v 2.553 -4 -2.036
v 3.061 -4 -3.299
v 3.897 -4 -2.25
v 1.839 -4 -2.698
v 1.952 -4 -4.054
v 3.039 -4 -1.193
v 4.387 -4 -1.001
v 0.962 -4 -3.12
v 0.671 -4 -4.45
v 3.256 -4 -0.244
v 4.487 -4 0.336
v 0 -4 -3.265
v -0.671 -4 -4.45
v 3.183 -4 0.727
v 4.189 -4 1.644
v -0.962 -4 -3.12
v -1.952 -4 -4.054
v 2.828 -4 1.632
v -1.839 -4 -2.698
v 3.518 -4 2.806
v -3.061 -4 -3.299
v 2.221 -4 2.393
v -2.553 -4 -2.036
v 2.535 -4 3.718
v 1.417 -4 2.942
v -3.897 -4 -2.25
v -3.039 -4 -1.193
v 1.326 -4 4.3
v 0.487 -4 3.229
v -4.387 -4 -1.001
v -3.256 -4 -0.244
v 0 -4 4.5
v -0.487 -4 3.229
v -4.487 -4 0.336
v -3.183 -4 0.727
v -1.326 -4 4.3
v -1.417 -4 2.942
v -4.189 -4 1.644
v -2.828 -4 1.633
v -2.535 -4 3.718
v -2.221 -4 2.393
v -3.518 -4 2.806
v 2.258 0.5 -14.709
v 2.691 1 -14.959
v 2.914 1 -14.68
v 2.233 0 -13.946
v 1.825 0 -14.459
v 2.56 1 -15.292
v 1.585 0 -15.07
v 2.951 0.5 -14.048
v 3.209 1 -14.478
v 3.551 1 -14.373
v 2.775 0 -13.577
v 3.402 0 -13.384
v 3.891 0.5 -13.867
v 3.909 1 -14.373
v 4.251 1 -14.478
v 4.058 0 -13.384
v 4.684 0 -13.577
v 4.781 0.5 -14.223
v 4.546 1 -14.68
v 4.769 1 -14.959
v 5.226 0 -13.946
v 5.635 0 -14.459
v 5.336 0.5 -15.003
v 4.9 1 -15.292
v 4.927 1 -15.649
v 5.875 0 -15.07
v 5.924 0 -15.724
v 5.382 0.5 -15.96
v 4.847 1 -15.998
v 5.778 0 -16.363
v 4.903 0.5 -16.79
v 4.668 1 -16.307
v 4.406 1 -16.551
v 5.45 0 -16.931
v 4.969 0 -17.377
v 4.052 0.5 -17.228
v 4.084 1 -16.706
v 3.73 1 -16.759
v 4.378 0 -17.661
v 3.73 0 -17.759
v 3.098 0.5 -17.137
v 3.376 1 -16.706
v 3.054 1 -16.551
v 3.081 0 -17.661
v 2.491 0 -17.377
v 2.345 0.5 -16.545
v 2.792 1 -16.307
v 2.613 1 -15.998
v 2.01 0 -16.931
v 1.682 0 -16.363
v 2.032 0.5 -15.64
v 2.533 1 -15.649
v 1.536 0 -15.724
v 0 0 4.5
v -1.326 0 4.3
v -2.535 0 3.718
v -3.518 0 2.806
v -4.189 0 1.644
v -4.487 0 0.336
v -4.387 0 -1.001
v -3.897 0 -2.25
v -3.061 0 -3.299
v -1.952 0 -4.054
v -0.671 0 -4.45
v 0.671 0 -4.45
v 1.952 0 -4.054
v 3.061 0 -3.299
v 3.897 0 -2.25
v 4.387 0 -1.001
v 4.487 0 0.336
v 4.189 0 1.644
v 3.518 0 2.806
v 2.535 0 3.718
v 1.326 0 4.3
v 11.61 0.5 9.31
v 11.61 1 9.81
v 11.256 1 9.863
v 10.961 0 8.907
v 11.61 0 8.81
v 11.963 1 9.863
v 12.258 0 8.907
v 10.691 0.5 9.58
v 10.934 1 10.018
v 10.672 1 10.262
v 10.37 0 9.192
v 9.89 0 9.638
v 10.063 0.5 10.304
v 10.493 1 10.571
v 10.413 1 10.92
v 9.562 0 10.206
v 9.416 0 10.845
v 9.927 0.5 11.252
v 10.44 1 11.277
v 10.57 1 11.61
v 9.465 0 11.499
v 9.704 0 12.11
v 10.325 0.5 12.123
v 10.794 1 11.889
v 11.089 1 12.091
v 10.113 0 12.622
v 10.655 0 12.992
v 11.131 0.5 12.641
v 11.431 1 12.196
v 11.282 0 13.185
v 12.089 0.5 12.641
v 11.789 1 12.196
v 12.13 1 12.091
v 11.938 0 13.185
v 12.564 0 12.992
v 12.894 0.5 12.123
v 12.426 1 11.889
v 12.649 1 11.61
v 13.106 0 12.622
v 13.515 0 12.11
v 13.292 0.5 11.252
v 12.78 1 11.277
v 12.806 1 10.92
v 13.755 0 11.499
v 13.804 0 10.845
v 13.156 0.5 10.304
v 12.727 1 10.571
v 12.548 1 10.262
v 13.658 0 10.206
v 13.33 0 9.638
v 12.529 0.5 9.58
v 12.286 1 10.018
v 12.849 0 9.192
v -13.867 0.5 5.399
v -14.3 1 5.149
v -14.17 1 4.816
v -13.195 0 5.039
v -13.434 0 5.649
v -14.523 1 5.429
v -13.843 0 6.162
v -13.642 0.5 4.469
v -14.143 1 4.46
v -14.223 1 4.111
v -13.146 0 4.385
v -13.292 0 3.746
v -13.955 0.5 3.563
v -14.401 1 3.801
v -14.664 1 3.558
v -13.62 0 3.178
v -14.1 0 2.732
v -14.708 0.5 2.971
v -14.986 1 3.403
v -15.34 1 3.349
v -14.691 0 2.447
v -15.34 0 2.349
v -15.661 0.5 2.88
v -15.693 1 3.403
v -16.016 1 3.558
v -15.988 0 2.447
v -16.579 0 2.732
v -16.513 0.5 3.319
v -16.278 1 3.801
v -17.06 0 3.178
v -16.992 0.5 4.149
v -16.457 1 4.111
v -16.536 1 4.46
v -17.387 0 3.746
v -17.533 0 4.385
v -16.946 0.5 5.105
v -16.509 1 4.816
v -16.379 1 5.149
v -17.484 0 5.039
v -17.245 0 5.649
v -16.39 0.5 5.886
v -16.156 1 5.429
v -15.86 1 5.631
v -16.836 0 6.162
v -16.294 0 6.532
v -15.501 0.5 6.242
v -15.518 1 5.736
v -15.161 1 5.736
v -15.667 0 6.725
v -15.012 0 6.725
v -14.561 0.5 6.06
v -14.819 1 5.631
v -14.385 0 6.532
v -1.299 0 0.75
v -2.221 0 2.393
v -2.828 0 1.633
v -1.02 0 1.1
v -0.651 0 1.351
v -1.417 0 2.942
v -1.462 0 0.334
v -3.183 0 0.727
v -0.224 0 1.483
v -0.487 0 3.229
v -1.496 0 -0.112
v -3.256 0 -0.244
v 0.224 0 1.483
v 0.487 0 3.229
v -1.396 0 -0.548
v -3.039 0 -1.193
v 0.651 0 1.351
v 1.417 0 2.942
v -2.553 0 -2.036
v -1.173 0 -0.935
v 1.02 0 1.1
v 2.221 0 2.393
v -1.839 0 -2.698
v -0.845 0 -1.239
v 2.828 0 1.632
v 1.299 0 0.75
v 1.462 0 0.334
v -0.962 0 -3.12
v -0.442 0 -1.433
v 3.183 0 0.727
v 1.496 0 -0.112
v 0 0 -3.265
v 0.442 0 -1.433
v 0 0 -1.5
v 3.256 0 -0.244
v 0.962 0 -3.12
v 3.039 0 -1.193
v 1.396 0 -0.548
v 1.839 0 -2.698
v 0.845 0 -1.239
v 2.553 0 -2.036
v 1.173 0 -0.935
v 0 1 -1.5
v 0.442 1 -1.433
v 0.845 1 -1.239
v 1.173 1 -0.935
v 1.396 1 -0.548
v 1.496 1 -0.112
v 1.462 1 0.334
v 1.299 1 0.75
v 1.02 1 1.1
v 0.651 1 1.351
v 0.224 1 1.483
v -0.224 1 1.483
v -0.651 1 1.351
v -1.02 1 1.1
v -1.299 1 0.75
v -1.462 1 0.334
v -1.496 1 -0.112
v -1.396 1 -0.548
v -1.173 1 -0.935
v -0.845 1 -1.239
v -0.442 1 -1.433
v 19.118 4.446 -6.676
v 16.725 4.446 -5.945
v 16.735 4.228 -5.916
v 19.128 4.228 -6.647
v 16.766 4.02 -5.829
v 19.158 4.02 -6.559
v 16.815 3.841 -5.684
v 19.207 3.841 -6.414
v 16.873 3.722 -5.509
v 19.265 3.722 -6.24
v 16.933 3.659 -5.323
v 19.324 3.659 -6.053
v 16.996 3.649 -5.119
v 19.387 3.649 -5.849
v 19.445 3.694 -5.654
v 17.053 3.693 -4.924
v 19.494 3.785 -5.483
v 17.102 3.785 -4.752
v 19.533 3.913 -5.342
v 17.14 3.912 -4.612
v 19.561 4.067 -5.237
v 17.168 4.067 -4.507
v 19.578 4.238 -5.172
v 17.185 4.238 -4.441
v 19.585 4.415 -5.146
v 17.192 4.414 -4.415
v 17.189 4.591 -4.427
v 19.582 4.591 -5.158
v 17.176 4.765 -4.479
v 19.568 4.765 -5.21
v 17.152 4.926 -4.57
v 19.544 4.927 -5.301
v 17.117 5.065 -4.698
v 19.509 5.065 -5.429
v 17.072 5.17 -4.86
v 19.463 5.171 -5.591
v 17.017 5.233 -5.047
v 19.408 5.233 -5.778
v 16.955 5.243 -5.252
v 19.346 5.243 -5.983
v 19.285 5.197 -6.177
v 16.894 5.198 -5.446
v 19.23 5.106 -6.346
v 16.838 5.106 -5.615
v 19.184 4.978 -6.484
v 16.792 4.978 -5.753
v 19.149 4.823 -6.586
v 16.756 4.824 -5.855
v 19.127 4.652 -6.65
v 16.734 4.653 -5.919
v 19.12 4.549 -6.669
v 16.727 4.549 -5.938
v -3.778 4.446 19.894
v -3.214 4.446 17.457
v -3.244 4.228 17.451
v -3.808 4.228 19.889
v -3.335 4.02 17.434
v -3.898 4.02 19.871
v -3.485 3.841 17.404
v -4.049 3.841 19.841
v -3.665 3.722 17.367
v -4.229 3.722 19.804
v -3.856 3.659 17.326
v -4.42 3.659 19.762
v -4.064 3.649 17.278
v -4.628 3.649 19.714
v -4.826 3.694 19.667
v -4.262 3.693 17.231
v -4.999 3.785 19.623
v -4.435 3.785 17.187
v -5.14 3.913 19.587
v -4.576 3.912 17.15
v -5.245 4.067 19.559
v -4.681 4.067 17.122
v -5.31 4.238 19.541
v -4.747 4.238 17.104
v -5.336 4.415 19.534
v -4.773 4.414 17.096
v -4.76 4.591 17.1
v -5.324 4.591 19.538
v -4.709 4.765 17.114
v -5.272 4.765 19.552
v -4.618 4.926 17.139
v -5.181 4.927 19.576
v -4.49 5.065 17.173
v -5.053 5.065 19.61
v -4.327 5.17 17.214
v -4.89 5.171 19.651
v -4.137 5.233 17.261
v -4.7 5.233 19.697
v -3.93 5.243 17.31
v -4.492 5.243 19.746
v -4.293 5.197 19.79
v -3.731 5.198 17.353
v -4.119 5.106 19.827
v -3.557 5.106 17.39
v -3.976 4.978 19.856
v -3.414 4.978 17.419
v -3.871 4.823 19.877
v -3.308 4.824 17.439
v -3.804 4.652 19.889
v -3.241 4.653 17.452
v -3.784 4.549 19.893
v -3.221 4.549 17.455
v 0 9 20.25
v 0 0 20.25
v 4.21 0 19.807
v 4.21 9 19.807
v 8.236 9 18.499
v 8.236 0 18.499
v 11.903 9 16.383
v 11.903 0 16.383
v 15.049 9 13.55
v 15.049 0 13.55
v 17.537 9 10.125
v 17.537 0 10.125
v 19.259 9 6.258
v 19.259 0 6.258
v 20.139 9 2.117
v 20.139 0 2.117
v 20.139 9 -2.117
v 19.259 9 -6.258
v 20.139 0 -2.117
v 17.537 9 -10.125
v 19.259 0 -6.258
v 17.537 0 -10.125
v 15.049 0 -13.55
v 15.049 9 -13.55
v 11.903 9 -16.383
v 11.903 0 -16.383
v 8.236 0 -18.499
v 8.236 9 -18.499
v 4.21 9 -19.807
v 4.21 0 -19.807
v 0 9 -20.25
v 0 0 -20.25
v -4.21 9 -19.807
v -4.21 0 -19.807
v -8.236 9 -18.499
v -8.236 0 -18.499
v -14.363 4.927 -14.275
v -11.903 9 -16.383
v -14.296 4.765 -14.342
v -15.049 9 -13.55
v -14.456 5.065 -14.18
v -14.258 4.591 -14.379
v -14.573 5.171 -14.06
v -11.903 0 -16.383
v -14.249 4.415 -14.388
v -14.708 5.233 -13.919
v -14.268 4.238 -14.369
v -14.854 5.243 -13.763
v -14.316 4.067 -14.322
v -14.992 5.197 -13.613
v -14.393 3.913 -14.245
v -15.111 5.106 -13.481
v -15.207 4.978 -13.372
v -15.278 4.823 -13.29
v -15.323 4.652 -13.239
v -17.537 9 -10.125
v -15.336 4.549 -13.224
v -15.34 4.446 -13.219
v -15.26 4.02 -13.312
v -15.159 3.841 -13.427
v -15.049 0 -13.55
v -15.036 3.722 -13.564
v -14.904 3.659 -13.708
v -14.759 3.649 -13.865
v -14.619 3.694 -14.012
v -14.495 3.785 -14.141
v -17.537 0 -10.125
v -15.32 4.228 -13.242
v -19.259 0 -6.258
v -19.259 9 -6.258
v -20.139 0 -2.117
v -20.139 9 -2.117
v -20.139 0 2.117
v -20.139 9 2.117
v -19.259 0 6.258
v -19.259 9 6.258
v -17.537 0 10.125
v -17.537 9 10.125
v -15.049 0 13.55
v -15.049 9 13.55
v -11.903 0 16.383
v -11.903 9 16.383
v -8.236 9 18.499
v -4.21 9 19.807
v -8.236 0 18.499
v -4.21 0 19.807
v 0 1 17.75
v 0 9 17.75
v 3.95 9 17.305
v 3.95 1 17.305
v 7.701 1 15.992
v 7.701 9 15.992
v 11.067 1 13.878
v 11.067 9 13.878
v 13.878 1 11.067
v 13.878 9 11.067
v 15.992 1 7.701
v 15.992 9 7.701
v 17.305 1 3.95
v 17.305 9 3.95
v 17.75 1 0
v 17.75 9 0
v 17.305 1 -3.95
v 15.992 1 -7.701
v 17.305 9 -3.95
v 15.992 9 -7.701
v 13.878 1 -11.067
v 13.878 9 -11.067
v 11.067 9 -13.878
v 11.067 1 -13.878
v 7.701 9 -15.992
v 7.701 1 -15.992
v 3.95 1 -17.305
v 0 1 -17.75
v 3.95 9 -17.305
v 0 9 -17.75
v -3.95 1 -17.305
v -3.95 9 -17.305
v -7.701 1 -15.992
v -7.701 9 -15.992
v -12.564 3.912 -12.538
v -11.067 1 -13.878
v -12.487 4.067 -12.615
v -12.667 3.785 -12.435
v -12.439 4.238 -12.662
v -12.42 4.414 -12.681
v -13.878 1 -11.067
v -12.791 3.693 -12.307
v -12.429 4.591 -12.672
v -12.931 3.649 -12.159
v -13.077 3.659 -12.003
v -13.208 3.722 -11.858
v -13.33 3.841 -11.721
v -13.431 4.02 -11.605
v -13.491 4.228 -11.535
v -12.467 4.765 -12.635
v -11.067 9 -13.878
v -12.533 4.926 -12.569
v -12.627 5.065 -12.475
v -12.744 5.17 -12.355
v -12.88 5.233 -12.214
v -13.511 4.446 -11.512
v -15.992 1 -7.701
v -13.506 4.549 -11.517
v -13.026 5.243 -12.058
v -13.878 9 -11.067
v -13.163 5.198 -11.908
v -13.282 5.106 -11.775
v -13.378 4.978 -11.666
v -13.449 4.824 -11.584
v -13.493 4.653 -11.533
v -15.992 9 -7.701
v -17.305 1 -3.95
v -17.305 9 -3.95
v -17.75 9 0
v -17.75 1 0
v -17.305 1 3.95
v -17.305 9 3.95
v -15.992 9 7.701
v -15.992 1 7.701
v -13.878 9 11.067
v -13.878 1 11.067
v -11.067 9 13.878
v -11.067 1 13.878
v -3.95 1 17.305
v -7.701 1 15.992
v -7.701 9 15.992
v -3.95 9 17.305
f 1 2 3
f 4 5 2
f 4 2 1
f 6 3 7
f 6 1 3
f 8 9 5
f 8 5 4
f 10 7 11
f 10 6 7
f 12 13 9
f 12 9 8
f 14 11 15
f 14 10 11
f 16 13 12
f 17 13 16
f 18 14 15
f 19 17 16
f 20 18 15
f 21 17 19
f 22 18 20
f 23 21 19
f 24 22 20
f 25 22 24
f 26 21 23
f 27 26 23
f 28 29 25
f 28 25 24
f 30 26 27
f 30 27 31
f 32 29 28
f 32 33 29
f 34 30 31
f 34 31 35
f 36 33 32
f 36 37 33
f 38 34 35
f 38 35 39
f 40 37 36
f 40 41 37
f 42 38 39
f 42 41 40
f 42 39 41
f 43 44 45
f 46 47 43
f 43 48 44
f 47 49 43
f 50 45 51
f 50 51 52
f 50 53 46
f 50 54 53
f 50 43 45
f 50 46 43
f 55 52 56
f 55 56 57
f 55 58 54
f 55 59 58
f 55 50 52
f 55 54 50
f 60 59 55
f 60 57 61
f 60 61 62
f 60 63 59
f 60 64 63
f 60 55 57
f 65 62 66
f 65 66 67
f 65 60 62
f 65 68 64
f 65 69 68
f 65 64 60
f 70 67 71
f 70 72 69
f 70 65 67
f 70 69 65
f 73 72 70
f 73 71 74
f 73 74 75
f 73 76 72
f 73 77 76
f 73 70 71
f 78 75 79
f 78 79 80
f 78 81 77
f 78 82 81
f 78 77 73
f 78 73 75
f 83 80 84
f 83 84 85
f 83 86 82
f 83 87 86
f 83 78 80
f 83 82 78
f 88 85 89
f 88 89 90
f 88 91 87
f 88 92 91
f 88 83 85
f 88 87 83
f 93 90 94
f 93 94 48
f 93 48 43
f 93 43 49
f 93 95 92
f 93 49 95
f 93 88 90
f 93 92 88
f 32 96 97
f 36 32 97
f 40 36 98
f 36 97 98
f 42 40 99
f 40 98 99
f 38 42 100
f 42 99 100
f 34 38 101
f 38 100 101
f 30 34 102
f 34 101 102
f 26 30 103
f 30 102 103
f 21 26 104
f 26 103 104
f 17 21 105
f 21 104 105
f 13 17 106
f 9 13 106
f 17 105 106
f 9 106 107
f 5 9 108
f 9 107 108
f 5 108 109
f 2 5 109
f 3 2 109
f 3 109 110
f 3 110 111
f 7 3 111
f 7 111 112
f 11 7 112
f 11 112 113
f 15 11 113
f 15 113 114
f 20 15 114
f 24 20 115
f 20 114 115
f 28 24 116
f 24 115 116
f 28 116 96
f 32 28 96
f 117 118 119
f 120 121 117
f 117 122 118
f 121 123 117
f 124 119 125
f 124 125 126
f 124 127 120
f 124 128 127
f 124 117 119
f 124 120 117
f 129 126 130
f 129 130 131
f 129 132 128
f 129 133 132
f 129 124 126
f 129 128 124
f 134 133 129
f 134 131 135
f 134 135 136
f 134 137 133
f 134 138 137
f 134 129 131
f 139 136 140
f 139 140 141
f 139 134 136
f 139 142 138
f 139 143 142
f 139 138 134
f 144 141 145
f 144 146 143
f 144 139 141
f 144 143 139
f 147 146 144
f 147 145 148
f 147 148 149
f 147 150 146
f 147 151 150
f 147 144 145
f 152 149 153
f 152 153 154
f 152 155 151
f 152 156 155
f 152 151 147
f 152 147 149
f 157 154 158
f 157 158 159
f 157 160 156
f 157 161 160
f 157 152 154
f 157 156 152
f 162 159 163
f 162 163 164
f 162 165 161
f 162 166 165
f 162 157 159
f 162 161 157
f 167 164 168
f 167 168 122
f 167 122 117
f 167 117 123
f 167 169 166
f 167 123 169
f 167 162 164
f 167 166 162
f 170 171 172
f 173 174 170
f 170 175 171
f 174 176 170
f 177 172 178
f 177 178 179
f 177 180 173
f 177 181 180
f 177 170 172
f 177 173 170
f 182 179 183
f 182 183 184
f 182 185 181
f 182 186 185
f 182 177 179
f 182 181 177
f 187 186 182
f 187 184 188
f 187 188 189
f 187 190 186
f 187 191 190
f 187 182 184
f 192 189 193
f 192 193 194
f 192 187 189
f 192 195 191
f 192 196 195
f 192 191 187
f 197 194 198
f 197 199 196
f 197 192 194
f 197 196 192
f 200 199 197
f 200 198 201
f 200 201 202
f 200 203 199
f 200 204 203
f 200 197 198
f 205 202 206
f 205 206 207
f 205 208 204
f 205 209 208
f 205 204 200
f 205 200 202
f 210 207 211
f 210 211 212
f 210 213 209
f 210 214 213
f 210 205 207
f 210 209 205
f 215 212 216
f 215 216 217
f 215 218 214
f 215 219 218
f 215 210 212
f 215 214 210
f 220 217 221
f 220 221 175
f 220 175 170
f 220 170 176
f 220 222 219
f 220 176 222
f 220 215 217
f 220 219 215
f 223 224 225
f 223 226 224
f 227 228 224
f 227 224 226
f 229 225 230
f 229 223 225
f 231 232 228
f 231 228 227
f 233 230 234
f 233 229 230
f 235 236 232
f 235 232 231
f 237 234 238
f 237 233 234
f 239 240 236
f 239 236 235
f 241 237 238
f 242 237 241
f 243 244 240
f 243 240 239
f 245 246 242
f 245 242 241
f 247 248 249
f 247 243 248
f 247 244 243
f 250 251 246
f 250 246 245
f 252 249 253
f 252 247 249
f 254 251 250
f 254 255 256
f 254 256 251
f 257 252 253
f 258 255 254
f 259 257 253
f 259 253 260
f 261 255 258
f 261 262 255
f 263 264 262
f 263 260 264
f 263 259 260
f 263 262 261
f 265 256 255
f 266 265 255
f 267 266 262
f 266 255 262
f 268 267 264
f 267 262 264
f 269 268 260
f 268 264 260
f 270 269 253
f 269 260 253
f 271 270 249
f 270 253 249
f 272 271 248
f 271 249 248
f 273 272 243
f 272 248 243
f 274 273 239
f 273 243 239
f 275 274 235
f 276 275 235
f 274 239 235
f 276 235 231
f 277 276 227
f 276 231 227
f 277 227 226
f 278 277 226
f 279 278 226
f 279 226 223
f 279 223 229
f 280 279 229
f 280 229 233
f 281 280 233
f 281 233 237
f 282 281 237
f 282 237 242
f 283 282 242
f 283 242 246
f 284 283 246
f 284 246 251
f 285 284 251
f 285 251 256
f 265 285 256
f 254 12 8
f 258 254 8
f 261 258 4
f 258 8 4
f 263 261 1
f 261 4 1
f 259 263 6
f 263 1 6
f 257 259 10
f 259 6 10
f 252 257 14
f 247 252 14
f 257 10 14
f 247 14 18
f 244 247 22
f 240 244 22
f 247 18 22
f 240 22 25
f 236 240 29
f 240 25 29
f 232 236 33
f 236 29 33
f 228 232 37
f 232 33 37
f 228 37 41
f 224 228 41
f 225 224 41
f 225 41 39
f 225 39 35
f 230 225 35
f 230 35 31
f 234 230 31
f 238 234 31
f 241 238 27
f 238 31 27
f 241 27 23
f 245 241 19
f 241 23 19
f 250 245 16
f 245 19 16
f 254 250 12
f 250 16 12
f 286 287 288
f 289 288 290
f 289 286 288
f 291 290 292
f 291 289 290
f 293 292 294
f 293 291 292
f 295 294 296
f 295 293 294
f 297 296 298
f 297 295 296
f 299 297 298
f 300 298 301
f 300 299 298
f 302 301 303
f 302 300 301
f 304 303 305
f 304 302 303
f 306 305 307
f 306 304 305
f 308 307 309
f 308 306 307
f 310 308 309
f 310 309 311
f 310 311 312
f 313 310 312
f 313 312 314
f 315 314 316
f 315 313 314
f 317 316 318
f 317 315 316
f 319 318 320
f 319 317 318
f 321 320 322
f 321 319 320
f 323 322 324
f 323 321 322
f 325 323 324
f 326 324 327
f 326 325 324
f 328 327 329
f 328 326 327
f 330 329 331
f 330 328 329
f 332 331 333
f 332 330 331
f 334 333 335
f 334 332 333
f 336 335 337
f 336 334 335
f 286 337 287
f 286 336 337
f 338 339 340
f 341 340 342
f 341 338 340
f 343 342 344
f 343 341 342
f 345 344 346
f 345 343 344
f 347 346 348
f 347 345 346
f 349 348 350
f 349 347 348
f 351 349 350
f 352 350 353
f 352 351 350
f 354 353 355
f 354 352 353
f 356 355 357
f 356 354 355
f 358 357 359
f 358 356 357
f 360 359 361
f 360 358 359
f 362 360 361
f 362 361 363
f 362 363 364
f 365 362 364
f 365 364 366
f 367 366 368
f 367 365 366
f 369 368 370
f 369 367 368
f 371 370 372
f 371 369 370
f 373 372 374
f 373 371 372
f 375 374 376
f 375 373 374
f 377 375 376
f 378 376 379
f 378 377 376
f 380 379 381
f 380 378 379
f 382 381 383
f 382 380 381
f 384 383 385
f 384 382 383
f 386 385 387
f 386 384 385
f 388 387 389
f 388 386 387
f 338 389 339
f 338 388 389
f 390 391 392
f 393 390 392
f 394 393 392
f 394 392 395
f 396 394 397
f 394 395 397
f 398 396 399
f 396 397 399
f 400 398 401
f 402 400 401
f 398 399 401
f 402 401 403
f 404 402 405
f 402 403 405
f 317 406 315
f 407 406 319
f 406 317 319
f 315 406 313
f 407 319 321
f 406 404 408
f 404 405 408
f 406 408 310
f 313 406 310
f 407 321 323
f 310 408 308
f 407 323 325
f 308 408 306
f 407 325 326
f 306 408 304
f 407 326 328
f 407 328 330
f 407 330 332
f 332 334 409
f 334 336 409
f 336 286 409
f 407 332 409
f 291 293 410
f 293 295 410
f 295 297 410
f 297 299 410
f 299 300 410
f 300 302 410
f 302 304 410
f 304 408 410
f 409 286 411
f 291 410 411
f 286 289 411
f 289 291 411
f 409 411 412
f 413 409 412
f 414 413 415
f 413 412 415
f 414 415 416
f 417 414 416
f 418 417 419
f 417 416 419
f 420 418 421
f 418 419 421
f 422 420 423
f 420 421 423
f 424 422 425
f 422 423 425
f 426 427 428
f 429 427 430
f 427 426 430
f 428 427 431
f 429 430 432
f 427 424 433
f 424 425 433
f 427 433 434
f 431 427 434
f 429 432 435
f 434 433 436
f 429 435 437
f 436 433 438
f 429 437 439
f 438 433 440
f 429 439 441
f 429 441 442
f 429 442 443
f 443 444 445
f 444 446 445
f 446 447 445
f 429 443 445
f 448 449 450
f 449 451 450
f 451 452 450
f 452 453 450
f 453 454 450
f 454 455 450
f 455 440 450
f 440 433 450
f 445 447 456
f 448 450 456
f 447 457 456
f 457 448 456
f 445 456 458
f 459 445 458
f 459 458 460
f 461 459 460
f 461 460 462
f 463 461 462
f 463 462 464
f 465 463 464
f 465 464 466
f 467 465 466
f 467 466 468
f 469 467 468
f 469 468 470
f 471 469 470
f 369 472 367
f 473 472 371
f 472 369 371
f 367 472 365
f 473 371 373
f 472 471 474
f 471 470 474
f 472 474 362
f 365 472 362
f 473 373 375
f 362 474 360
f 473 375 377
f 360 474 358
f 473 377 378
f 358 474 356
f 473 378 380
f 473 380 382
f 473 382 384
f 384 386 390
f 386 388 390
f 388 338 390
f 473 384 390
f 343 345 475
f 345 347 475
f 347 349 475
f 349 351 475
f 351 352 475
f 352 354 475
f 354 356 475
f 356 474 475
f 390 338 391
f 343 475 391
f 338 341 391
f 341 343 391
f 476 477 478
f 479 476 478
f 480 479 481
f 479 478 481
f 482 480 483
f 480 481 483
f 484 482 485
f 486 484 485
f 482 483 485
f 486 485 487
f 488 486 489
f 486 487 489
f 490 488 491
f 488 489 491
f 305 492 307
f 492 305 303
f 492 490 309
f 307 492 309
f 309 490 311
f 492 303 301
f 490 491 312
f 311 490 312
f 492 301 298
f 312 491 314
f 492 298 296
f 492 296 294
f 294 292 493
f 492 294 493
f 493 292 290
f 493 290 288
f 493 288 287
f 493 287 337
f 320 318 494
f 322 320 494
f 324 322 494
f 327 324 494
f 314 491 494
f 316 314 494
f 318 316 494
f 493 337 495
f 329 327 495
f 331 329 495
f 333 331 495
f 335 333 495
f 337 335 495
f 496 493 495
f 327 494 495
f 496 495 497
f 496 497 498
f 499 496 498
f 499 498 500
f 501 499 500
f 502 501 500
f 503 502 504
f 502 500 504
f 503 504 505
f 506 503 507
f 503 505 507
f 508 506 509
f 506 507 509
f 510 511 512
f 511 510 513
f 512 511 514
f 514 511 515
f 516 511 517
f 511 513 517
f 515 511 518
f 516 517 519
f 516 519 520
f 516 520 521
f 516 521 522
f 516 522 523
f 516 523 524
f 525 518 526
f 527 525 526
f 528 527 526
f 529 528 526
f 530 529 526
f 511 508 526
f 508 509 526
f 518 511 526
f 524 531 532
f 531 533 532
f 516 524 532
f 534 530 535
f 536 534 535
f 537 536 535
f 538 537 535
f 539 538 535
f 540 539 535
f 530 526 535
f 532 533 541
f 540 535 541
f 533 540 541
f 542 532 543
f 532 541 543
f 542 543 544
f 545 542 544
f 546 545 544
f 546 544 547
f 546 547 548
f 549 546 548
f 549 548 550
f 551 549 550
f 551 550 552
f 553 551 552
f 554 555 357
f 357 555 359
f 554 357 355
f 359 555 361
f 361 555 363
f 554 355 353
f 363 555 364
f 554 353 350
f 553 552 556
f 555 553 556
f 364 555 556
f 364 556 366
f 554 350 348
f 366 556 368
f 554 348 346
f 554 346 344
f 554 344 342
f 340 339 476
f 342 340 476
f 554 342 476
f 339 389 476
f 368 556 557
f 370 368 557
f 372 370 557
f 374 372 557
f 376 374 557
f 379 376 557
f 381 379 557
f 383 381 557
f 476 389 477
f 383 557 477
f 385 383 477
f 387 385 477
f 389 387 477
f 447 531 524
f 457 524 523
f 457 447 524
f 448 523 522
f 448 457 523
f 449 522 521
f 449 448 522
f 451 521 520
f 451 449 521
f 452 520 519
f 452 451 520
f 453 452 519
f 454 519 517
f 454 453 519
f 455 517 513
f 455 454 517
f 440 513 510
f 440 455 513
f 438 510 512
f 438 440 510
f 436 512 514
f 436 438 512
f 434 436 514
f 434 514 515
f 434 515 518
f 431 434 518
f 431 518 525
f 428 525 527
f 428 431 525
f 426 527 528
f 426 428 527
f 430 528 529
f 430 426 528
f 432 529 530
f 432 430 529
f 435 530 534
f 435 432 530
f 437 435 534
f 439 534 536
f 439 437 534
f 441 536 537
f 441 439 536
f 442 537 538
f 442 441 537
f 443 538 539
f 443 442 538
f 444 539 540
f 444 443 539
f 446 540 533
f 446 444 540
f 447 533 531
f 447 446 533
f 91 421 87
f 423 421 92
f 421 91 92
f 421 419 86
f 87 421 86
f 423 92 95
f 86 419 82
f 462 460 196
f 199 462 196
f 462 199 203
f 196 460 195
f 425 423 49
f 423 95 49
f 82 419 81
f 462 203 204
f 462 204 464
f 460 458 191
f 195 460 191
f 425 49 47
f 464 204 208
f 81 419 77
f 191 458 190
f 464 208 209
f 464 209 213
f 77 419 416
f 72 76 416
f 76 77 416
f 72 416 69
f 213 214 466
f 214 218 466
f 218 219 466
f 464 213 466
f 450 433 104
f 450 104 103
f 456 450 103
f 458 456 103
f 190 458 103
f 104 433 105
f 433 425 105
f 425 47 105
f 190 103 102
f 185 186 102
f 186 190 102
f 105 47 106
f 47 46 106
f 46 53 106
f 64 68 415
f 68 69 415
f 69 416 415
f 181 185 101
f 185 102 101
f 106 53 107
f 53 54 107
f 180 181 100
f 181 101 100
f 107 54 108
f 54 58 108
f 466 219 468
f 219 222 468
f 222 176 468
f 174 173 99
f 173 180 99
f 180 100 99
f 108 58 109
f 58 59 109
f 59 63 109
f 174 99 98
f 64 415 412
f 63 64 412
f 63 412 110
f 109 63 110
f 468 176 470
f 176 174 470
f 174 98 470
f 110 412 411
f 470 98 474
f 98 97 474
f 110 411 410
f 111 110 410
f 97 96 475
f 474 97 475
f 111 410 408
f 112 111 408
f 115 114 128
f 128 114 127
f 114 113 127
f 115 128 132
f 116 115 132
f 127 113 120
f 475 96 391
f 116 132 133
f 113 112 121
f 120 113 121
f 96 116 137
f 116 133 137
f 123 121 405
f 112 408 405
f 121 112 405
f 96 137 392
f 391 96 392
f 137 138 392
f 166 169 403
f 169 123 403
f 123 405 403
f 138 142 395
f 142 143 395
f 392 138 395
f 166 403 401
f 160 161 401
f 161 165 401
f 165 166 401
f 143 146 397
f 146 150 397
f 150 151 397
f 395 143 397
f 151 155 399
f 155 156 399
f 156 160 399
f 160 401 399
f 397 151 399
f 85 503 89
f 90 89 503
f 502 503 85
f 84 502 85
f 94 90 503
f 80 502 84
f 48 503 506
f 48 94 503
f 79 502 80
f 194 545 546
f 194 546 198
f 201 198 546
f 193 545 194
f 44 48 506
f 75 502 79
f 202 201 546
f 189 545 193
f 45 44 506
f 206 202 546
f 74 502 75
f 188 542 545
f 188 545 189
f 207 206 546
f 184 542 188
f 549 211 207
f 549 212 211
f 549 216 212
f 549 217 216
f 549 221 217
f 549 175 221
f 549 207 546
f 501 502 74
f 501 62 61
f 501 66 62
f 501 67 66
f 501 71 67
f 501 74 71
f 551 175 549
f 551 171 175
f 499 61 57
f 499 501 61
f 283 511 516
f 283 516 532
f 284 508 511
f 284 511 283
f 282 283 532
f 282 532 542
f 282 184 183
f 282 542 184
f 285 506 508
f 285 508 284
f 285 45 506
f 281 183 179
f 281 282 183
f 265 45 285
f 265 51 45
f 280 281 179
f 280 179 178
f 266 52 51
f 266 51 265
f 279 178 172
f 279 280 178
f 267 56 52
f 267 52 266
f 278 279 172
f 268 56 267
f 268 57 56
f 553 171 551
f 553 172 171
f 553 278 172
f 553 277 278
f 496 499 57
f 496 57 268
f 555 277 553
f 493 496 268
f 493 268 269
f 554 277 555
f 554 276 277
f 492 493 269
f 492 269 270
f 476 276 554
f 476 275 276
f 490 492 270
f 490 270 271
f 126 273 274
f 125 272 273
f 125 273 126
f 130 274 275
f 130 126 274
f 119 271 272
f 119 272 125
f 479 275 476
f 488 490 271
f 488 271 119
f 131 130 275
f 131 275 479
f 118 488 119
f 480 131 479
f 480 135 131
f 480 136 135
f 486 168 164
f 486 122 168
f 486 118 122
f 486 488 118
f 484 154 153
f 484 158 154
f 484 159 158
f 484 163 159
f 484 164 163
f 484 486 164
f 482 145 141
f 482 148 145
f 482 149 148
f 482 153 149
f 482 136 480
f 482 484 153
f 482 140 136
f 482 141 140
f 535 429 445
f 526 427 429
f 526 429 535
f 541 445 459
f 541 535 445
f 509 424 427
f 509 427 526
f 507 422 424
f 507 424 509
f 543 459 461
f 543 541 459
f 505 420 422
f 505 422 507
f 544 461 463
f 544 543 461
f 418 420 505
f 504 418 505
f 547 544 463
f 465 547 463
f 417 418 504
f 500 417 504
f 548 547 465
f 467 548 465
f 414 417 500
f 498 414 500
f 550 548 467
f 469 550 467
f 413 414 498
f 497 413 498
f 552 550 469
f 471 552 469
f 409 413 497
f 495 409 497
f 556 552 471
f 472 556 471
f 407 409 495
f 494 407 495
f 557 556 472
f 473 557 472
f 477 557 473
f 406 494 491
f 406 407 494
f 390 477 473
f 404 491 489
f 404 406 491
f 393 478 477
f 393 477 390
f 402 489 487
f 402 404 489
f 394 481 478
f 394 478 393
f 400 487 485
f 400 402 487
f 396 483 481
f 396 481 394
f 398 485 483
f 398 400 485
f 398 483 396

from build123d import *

# Parameters (mm, degrees)
SKETCH1_R           = 20.25
BOSS_EXTRUDE1_DEPTH = 9
SKETCH2_R           = 17.75
CUT_EXTRUDE1_DEPTH  = 8
CIRPATTERN1_COUNT   = 3
SKETCH5_R           = 1.5
CUT_EXTRUDE2_DEPTH  = 8
CIRPATTERN2_COUNT   = 3
SKETCH7_R           = 4.5
BOSS_EXTRUDE3_DEPTH = 4
SKETCH8_R           = 3.265
CUT_EXTRUDE3_DEPTH  = 4


with BuildPart() as part:
    # Sketch1 → Boss-Extrude1 (new body)
    with BuildSketch(Plane(origin=(0, 0, 0), x_dir=(1, 0, 0), z_dir=(0, 1, 0))):
        with Locations(Location((0, 0, 0), (0, 0, 270))):
            Circle(SKETCH1_R)
    extrude(amount=BOSS_EXTRUDE1_DEPTH)

    # Sketch2 → Cut-Extrude1 (cut)
    with BuildSketch(Plane(origin=(0, 9, 0), x_dir=(1, 0, 0), z_dir=(0, 1, 0))):
        with Locations(Location((0, 0, 0), (0, 0, 270))):
            Circle(SKETCH2_R)
    extrude(amount=-CUT_EXTRUDE1_DEPTH, mode=Mode.SUBTRACT)

    # Sketch4 → CSK SLOT for M2 Countersunk Flat Head Screw1 (revolve, cut)
    with BuildSketch(Plane(origin=(11.609715894, 0, 11.00974554), x_dir=(0, 0, -1), z_dir=(1, 0, 0))):
        Polygon((0, 0), (0, 6.521032743), (1.2, 5.8), (1.2, 1), (2.2, 0), align=None)
    csk_slot_for_m2_countersunk_flat_head_sc = revolve(axis=Axis((11.609715894, -6.35, 11.00974554), (0, 1, 0)), mode=Mode.SUBTRACT)

    # CirPattern1: CSK SLOT for M2 Countersunk Flat Head Screw1 ×3 about axis
    cirpattern1_axis = Axis((0, 0, 0), (0, 1, 0))
    for i in range(1, CIRPATTERN1_COUNT):
        add(csk_slot_for_m2_countersunk_flat_head_sc.rotate(cirpattern1_axis, i * 360 / CIRPATTERN1_COUNT), mode=Mode.SUBTRACT)

    # Sketch5 → Cut-Extrude2 (cut)
    with BuildSketch(Plane.XZ):
        with Locations(Location((0, 0, 0), (0, 0, 270))):
            Circle(SKETCH5_R)
    extrude(amount=-CUT_EXTRUDE2_DEPTH, mode=Mode.SUBTRACT)

    # Sketch6 → M2 Tapped Hole1 (revolve, cut)
    with BuildSketch(Plane(origin=(-4.560794248, 4.445790719, 19.729715047), x_dir=(0.974306915892993, 0, 0.22522440729877435), z_dir=(0, 1, 0))):
        Polygon((0, 0), (0, 4.980688495), (0.8, 4.5), (0.8, 0), align=None)
    m2_tapped_hole1 = revolve(axis=Axis((-5.990969234, 4.445790719, 25.916563963), (0.22522440729877433, 0, -0.9743069158929931)), mode=Mode.SUBTRACT)

    # CirPattern2: M2 Tapped Hole1 ×3 about axis
    cirpattern2_axis = Axis((0, 9, 0), (0, -1, 0))
    for i in range(1, CIRPATTERN2_COUNT):
        add(m2_tapped_hole1.rotate(cirpattern2_axis, i * 360 / CIRPATTERN2_COUNT), mode=Mode.SUBTRACT)

    # Sketch7 → Boss-Extrude3 (add)
    with BuildSketch(Plane.XZ):
        with Locations(Location((0, 0, 0), (0, 0, 90))):
            Circle(SKETCH7_R)
    extrude(amount=BOSS_EXTRUDE3_DEPTH)

    # Sketch8 → Cut-Extrude3 (cut)
    with BuildSketch(Plane.XZ.offset(4)):
        with Locations(Location((0, 0, 0), (0, 0, 270))):
            Circle(SKETCH8_R)
    extrude(amount=-CUT_EXTRUDE3_DEPTH, mode=Mode.SUBTRACT)


solid = part.part
